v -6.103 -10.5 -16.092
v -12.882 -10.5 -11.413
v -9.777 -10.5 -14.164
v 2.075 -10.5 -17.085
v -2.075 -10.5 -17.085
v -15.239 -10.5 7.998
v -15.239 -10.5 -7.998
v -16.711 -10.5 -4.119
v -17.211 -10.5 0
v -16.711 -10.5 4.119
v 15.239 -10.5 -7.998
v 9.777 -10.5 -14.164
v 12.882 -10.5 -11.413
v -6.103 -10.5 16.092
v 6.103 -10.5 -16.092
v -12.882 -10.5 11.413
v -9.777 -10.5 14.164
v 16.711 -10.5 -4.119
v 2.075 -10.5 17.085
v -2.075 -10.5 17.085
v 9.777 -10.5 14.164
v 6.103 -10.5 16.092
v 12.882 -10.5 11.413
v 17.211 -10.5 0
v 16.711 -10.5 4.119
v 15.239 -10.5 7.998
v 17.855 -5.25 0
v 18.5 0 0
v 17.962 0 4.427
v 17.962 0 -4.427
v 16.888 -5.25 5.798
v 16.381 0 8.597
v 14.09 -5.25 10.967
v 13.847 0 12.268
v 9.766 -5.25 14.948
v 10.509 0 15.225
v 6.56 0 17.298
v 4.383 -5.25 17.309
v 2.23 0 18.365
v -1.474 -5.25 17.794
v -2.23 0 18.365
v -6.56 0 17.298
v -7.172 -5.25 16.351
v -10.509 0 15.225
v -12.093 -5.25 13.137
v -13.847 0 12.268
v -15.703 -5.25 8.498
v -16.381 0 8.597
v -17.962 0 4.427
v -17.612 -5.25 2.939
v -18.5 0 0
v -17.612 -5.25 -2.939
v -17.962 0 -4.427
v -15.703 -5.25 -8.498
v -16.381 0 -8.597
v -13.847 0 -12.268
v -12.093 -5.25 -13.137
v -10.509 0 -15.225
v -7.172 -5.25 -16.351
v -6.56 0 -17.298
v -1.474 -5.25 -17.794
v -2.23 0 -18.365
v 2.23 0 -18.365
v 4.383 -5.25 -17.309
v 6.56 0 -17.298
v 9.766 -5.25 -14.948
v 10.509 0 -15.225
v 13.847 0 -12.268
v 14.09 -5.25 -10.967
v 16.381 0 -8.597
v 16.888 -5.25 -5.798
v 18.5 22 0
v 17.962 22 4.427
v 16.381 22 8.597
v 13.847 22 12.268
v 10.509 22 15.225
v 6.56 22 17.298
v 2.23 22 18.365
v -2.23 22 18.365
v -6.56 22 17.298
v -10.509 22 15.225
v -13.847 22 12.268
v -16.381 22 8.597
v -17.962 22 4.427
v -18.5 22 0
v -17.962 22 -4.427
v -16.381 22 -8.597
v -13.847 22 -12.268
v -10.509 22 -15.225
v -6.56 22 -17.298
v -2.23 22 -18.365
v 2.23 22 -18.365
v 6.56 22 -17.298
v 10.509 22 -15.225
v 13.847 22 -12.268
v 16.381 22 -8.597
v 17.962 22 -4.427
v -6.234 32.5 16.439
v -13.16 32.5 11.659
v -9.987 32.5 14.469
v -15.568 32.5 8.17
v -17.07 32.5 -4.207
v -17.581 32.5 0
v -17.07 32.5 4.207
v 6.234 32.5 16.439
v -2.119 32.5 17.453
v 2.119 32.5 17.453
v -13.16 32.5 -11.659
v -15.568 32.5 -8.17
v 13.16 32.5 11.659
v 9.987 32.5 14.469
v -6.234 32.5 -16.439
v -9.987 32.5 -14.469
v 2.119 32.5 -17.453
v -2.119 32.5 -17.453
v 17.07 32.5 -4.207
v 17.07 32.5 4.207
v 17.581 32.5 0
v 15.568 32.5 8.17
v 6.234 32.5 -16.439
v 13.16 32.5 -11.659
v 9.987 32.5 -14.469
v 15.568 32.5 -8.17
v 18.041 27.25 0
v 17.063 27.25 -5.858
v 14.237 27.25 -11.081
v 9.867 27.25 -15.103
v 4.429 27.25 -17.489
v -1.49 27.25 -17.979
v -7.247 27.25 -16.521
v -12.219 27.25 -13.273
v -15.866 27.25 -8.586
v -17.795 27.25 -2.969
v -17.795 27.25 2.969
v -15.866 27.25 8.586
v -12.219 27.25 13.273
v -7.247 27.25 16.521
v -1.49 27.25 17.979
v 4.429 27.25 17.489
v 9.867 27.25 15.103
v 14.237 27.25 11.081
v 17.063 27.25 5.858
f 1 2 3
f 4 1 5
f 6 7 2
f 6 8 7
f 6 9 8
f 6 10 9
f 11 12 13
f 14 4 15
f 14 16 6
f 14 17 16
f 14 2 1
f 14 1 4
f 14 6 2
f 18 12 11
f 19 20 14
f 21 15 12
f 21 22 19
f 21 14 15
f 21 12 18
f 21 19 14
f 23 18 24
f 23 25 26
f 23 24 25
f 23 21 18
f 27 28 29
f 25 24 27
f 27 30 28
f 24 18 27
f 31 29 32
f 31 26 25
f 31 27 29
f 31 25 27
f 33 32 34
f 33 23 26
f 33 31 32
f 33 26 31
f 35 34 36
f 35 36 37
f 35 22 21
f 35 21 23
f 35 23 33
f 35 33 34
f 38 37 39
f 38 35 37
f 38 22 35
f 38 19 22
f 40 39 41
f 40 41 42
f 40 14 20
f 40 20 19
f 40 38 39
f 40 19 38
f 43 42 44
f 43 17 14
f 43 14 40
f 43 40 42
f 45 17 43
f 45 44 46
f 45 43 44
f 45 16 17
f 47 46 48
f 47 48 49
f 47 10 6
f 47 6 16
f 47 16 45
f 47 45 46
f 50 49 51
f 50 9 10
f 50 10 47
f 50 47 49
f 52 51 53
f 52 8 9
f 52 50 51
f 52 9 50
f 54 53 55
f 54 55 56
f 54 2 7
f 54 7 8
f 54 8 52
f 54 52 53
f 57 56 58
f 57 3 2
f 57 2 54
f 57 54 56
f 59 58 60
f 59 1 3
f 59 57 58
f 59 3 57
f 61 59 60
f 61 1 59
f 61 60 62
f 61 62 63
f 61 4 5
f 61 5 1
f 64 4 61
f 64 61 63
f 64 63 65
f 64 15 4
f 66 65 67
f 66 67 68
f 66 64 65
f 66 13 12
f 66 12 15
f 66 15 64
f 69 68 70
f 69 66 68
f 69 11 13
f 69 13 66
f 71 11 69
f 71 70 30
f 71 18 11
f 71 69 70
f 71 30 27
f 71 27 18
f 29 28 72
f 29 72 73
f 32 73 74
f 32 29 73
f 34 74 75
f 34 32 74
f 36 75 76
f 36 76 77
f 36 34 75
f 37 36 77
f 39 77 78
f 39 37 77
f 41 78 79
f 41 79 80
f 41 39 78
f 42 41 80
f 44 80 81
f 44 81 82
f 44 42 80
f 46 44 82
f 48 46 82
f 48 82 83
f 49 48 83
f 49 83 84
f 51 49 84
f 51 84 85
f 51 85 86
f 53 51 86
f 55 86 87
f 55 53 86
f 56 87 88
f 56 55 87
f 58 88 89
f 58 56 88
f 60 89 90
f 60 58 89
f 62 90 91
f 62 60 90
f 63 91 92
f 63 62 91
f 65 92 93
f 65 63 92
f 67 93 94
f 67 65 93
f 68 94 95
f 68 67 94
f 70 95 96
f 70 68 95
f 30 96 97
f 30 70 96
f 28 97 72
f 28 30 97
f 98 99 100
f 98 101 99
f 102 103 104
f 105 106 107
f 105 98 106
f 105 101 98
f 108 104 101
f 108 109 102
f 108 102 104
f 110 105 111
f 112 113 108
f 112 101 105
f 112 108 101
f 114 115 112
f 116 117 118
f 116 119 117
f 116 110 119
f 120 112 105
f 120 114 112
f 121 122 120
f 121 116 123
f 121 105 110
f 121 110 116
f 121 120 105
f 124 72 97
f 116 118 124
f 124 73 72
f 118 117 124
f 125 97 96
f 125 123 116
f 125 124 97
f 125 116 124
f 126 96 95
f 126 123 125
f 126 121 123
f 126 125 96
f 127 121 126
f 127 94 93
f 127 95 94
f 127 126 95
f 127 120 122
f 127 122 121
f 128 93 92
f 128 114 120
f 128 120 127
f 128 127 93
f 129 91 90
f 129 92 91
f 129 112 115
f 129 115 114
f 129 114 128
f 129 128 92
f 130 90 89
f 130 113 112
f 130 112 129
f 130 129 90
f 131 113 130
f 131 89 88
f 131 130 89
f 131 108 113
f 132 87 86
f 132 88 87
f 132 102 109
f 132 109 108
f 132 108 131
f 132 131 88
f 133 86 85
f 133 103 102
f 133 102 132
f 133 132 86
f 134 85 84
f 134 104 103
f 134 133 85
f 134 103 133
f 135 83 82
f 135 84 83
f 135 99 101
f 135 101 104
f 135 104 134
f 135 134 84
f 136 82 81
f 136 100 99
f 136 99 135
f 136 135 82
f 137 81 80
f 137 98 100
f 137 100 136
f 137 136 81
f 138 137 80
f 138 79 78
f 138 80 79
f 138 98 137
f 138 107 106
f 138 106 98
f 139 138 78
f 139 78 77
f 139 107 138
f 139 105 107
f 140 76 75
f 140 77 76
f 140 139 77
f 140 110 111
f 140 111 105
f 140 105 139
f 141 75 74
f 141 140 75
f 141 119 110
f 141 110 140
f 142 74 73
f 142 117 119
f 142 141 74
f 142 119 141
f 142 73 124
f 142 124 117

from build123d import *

# Parameters (mm, degrees)
F0_R       = 18.5
F1_DEPTH   = 22
F3_R       = 18.5
F3_R_2     = 15
F4_DEPTH   = 10.5
F4_TAPER   = 7
F1_FACE1_R = 18.5
F5_DEPTH   = 10.5
F5_TAPER   = 5


with BuildPart() as f1:
    # F0 (on Front) → F1 (new body)
    with BuildSketch(Plane.XZ):
        Circle(F0_R)
    extrude(amount=-F1_DEPTH)

    # F3 (on face) → F4 (join)
    with BuildSketch(Plane.XZ):
        Circle(F3_R)
        Circle(F3_R_2, mode=Mode.SUBTRACT)
        Circle(F3_R_2)
    extrude(amount=F4_DEPTH, taper=F4_TAPER)

    # F1_face1 (on face) → F5 (join)
    with BuildSketch(Plane(origin=(0, 22, 0), x_dir=(1, 0, 0), z_dir=(0, 1, 0))):
        Circle(F1_FACE1_R)
    extrude(amount=F5_DEPTH, taper=F5_TAPER)


solid = f1.part
